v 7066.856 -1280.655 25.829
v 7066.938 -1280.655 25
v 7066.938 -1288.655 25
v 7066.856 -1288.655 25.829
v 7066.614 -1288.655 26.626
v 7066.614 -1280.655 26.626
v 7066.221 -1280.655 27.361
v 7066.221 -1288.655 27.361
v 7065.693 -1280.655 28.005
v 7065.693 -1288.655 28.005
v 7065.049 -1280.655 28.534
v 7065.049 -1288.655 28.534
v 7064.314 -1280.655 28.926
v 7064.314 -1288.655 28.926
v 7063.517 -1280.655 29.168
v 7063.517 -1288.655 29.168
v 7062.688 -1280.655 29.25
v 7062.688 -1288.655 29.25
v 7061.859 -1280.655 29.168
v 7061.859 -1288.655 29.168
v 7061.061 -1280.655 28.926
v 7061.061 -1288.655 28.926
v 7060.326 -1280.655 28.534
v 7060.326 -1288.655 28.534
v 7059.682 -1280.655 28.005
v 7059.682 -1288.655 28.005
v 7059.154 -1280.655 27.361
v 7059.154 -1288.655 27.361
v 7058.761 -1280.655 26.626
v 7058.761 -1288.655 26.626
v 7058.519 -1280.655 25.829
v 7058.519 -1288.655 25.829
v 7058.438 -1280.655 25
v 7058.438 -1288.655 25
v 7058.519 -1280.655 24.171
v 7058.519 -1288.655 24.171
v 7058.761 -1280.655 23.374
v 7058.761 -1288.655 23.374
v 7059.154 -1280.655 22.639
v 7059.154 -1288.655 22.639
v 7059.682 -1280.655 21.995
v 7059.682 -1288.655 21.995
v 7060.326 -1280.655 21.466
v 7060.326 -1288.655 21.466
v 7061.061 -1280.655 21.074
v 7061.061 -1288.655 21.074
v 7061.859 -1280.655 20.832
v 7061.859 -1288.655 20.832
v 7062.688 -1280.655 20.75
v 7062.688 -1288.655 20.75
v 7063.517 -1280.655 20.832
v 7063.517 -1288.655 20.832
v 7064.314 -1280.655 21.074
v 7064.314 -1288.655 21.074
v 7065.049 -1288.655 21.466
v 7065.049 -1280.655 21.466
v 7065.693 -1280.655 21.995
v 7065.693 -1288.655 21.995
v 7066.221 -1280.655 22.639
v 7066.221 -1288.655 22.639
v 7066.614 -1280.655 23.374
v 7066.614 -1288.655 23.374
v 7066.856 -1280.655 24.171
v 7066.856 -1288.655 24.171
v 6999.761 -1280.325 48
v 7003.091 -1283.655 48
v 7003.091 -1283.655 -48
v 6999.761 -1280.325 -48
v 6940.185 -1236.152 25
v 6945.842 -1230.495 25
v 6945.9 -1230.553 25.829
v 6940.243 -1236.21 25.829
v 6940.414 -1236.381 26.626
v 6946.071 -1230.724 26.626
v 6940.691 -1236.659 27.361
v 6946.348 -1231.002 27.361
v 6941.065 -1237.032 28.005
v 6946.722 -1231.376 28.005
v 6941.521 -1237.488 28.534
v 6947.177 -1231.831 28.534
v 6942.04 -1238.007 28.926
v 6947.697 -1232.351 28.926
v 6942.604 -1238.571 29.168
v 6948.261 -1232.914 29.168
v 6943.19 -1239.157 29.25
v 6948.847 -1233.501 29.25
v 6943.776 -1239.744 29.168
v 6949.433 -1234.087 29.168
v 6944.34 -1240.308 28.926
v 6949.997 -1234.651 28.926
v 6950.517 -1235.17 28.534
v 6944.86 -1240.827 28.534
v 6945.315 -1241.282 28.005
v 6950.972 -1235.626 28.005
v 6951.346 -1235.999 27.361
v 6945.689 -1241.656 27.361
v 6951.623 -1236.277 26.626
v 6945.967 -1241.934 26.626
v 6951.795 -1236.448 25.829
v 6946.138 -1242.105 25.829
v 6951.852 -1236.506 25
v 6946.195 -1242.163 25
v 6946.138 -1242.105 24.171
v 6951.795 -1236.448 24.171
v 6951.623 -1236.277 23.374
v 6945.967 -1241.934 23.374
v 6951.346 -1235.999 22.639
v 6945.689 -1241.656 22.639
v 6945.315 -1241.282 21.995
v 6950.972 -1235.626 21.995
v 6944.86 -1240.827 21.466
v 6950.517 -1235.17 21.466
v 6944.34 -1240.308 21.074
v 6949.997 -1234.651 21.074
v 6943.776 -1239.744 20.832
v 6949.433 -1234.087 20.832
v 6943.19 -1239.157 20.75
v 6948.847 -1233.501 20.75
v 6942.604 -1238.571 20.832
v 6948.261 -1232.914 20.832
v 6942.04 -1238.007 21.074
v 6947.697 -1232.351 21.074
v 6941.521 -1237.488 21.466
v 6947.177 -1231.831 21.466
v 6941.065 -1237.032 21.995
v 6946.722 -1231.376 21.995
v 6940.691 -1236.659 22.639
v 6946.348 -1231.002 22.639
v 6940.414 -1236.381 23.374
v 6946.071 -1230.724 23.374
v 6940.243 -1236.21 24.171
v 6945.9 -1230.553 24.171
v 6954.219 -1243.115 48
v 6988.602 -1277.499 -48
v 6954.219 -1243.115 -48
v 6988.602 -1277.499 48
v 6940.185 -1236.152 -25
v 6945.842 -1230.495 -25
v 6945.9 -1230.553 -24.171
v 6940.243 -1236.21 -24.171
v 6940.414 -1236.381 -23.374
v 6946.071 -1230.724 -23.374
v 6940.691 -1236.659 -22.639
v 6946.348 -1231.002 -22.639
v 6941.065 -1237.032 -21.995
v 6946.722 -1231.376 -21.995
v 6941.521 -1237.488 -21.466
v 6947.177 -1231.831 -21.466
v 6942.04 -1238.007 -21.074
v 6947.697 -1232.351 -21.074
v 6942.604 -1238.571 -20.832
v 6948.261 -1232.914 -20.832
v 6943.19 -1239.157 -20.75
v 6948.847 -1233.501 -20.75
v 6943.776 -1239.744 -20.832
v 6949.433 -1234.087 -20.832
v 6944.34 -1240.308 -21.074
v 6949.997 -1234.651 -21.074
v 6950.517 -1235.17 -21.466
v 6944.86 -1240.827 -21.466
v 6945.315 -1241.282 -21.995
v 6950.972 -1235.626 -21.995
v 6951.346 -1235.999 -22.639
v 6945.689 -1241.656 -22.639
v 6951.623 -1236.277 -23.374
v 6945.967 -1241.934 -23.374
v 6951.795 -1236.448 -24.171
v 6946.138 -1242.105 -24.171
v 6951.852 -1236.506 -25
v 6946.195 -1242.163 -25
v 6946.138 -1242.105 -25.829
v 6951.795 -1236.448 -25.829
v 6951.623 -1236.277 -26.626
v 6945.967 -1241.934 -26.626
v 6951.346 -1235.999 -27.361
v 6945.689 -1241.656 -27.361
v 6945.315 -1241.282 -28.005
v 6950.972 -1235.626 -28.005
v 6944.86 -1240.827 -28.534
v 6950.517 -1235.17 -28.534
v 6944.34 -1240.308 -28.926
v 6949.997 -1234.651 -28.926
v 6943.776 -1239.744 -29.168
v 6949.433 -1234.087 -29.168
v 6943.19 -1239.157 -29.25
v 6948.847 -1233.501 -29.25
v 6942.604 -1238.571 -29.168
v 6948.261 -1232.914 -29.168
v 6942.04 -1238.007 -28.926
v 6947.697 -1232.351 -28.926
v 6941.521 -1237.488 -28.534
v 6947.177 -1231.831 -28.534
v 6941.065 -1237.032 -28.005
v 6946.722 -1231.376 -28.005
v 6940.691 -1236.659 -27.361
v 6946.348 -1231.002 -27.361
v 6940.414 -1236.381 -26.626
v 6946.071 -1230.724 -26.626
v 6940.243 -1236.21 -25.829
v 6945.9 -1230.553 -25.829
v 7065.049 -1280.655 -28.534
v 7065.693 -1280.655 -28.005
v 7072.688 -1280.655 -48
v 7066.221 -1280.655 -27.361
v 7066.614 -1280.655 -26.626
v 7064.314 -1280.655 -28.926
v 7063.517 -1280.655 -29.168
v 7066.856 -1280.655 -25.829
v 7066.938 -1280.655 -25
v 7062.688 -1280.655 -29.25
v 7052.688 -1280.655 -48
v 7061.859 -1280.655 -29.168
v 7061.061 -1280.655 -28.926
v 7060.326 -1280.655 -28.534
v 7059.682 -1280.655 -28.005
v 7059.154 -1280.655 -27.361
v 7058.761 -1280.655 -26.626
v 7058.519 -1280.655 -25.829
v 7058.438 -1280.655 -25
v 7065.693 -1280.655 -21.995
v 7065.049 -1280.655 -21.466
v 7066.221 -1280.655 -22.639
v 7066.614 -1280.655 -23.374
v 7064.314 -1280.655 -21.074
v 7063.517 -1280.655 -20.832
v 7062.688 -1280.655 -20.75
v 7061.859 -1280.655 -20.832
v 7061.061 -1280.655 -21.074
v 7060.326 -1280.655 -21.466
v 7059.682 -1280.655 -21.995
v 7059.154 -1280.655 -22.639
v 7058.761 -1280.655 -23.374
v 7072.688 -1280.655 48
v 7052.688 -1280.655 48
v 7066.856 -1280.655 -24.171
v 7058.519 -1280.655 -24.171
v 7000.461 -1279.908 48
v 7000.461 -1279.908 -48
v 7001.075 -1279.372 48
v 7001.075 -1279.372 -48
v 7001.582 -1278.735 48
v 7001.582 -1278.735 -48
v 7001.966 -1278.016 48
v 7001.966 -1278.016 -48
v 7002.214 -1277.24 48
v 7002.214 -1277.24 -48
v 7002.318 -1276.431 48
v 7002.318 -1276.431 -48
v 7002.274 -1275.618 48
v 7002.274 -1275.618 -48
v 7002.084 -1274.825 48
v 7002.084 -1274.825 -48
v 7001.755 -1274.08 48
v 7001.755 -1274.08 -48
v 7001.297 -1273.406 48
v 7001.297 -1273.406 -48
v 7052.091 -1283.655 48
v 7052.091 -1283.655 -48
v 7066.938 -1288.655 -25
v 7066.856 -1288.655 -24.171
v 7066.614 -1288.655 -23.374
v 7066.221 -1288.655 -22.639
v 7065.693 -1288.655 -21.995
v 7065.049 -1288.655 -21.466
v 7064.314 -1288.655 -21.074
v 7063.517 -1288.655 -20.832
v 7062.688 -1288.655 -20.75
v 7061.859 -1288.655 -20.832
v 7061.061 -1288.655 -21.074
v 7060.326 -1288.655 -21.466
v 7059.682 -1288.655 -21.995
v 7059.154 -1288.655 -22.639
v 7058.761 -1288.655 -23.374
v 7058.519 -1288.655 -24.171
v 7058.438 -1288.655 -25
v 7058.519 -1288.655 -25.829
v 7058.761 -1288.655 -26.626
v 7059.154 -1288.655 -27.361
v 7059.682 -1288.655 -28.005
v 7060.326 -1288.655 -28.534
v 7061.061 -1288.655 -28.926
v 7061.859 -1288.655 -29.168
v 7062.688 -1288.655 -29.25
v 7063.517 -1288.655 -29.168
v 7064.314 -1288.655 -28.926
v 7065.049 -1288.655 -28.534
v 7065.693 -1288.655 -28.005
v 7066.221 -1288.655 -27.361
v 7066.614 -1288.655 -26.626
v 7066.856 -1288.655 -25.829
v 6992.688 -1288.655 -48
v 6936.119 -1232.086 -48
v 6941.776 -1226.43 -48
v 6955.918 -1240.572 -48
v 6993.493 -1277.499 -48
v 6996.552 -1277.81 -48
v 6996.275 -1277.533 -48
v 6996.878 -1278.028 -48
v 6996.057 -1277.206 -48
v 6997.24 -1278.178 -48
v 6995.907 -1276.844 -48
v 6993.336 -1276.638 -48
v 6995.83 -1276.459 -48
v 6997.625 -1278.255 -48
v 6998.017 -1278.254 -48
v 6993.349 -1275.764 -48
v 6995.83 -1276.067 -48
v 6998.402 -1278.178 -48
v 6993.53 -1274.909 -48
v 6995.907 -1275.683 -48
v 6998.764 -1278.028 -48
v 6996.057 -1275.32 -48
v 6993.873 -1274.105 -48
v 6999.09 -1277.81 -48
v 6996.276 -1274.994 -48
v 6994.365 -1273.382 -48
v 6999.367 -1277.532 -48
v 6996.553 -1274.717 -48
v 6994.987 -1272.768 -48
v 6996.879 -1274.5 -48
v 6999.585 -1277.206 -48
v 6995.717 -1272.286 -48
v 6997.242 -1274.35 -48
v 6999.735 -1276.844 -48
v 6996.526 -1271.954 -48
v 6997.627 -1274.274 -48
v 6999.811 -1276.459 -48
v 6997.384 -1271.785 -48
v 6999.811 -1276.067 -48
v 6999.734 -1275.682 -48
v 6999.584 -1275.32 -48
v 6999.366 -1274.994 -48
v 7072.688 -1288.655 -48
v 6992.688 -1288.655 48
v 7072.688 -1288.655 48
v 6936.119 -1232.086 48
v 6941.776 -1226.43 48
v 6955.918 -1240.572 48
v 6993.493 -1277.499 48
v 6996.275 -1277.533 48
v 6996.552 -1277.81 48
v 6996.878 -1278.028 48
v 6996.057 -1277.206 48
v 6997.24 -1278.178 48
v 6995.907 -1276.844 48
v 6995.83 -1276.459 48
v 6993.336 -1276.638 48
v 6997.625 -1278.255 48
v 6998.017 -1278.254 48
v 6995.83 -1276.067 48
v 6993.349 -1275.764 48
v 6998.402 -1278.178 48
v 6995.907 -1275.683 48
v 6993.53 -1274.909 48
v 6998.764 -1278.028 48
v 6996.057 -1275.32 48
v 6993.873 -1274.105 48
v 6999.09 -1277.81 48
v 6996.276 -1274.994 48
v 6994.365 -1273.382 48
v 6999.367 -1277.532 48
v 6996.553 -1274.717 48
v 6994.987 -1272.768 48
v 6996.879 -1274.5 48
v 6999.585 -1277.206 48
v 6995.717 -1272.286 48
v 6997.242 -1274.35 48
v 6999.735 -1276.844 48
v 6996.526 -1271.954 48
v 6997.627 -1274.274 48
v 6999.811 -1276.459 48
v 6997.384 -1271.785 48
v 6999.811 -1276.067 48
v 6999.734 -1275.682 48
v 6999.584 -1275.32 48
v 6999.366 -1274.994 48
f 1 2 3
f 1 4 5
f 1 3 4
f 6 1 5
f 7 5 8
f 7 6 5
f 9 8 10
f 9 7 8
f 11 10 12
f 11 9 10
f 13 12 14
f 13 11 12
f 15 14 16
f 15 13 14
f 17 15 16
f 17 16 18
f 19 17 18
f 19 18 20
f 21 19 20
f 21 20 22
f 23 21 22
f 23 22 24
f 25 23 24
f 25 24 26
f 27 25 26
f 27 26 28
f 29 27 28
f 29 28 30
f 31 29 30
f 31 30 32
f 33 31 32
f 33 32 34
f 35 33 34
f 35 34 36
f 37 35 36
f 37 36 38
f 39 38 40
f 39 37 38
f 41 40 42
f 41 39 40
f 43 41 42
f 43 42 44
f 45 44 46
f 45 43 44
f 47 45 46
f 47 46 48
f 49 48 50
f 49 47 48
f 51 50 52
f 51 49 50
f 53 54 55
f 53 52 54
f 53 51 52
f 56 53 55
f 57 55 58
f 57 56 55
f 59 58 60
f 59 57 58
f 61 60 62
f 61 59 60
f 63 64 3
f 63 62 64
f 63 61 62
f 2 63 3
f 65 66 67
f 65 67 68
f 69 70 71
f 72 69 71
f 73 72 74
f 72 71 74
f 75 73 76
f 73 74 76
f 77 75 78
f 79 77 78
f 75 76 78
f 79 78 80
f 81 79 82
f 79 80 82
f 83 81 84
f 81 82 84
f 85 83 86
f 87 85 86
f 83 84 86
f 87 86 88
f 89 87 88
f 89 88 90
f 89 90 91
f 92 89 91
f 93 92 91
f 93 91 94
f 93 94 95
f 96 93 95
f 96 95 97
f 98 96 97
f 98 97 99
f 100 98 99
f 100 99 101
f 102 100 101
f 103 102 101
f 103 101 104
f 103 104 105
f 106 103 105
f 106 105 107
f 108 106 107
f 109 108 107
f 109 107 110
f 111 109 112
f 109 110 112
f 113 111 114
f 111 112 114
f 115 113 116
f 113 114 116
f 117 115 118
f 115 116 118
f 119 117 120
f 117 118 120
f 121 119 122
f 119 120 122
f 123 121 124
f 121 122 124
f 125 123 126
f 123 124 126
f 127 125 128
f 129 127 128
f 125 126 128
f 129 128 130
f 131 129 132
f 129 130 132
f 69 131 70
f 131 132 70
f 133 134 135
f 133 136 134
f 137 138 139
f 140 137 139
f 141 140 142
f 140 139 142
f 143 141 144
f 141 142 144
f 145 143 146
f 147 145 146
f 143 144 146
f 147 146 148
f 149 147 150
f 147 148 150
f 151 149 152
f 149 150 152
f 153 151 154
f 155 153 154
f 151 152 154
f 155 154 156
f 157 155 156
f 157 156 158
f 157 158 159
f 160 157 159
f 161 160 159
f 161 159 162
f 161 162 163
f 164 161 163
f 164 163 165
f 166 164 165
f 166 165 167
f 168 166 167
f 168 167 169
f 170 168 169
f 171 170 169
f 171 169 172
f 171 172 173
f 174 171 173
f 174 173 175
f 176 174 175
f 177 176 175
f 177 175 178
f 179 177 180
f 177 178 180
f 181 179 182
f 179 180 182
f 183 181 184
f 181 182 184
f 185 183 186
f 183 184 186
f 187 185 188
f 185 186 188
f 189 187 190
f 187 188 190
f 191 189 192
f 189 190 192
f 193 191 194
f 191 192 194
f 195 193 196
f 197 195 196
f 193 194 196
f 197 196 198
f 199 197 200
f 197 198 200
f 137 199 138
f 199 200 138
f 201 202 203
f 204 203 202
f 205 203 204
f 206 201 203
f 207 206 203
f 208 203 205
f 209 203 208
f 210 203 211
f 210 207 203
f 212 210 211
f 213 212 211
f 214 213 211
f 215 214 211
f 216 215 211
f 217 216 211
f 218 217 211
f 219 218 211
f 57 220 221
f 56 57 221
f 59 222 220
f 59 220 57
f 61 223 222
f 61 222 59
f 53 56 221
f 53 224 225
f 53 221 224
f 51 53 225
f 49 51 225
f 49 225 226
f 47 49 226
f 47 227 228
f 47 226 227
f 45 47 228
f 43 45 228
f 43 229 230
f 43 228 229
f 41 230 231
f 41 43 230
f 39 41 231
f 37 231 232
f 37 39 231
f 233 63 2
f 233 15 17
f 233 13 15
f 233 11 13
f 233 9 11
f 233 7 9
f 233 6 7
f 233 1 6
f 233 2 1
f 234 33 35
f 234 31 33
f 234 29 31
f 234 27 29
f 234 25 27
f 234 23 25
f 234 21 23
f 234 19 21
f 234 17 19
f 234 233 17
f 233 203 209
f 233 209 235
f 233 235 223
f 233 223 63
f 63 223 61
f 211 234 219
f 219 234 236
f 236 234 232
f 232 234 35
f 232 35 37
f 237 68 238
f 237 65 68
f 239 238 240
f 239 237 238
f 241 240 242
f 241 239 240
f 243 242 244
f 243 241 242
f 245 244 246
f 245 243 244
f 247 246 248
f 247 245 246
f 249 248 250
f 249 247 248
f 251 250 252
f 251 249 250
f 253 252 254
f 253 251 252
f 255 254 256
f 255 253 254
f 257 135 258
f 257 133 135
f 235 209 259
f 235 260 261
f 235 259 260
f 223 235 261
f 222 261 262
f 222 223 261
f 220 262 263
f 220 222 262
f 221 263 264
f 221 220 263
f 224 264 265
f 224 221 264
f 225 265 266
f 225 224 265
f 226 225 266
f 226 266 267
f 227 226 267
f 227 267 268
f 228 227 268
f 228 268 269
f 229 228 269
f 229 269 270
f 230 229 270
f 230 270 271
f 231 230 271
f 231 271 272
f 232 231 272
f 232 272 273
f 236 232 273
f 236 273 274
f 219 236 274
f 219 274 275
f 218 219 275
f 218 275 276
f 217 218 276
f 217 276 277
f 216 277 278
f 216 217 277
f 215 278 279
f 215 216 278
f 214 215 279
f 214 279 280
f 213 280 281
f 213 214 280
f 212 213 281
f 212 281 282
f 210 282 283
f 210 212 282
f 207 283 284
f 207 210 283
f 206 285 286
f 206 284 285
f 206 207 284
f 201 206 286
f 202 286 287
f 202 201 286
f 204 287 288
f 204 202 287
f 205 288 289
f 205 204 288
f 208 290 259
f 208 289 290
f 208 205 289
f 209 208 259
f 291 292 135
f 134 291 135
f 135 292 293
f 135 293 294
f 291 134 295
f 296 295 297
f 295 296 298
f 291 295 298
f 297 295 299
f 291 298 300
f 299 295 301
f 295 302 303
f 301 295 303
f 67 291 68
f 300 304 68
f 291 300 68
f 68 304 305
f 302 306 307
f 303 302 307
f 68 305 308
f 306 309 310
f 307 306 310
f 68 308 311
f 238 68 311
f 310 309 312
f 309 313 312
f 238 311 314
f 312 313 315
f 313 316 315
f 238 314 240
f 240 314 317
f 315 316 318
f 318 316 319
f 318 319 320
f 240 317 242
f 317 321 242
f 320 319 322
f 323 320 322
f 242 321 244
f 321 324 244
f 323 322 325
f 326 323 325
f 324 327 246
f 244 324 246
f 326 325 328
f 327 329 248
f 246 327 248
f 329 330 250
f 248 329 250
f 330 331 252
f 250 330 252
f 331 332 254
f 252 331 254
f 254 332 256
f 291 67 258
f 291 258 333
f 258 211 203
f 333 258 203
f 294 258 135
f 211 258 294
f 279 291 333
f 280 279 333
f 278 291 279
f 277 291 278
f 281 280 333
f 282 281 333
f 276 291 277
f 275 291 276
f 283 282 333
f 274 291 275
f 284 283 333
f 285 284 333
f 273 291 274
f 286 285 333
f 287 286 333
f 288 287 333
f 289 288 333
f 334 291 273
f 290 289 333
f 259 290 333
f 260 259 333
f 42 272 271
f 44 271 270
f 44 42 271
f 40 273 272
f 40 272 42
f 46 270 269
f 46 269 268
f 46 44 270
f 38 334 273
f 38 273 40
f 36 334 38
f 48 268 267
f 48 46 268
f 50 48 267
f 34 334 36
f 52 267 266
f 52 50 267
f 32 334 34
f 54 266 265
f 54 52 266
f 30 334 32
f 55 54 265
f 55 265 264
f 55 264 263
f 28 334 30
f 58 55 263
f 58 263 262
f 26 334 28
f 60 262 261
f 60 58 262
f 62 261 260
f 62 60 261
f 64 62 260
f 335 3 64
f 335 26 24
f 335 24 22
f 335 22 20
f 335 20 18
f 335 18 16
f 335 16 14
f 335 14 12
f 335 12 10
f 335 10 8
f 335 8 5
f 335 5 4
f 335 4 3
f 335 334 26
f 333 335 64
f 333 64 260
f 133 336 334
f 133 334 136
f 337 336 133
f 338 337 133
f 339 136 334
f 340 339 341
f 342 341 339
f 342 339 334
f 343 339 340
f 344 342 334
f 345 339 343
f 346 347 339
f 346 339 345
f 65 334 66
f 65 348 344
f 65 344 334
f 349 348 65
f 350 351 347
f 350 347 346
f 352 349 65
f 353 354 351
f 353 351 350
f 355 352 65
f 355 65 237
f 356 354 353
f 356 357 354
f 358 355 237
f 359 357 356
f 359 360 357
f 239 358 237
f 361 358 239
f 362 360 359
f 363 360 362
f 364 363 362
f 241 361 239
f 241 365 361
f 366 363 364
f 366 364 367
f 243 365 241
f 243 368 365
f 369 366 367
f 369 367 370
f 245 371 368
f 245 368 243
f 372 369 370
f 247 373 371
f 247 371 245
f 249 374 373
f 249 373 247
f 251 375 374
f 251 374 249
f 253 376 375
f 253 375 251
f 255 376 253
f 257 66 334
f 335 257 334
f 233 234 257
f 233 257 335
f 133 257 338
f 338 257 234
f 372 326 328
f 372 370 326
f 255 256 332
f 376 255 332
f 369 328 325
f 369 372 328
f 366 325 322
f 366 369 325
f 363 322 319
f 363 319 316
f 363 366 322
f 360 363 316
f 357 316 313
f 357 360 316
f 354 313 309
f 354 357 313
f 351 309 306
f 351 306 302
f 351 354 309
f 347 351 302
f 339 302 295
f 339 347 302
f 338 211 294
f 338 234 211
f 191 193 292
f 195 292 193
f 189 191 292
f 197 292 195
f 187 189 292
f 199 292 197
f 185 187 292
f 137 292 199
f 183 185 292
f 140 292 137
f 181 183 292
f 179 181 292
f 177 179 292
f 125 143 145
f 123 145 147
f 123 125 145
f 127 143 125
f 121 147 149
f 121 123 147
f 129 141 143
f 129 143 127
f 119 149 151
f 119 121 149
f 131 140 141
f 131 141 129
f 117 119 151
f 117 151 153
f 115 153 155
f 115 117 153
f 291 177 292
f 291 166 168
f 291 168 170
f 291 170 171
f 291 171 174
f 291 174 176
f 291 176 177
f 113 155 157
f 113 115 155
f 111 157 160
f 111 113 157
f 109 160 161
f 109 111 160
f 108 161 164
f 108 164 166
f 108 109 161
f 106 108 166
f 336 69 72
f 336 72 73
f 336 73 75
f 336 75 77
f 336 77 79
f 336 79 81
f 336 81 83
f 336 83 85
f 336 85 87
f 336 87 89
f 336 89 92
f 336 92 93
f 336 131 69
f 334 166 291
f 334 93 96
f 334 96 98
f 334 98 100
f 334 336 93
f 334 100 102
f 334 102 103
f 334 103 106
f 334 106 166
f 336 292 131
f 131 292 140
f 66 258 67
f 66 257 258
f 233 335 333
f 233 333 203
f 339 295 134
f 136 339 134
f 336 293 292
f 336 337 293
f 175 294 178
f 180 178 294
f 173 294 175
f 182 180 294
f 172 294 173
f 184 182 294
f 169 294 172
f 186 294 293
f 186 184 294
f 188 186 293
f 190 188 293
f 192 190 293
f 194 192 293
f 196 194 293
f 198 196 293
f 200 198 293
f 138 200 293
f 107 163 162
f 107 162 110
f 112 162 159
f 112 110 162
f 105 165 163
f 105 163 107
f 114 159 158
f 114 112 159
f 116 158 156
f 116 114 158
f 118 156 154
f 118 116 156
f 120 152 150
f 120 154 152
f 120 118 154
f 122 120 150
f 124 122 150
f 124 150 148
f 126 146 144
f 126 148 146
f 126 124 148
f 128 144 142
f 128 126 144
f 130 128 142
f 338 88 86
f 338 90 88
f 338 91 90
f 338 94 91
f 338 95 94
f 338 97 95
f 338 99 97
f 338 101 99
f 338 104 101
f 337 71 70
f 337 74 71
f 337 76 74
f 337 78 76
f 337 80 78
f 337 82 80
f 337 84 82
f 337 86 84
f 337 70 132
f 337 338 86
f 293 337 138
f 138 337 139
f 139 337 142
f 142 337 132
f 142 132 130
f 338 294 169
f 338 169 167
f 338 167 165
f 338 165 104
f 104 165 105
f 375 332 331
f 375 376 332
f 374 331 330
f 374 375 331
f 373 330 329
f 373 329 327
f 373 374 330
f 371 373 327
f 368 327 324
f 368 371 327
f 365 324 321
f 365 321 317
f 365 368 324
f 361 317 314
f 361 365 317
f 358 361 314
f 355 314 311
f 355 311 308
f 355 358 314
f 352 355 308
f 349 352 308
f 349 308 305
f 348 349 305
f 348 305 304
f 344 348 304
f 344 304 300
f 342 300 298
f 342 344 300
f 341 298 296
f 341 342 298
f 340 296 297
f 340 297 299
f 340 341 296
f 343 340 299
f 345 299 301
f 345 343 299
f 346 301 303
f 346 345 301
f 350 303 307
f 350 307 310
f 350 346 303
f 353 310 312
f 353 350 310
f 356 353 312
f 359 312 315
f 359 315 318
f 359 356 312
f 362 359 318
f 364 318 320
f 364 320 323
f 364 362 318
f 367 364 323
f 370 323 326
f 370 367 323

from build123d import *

# Parameters (mm, degrees)
EXTRUDE_1_DEPTH         = 48
HOLE_WIZARD_8_5_8_5_1_D = 8.5


with BuildPart() as part:
    # 草图1 → 凸台-拉伸1 (new, symmetric)
    with BuildSketch(Plane.XY):
        Polygon((6936.119122288, -1232.086390659), (6992.687664783, -1288.654933154), (7072.687664783, -1288.654933154), (7072.687664783, -1280.654933154), (7052.687664783, -1280.654933154), (6955.918112162, -1240.571672033), (6941.775976538, -1226.429536409), align=None)
        with BuildLine():
            Line((7009.090927681, -1283.654933154), (7003.090927681, -1283.654933154))
            Line((7003.090927681, -1283.654933154), (6999.760549745, -1280.324555218))
            ThreePointArc((6999.760549745, -1280.324555218), (7002.213755914, -1277.239517812), (7001.296666197, -1273.406161221))
            Line((7001.296666197, -1273.406161221), (6999.365595427, -1274.993916141))
            ThreePointArc((6999.365595427, -1274.993916141), (6997.055371947, -1278.111879141), (6997.626530039, -1274.273571671))
            Line((6997.626530039, -1274.273571671), (6997.383769074, -1271.785386165))
            ThreePointArc((6997.383769074, -1271.785386165), (6994.101203016, -1273.731324494), (6993.49338103, -1277.49861375))
            Line((6993.49338103, -1277.49861375), (6988.602413191, -1277.49861375))
            Line((6988.602413191, -1277.49861375), (6954.21874867, -1243.114949228))
            Line((6954.21874867, -1243.114949228), (7052.090927681, -1283.654933154))
            Line((7052.090927681, -1283.654933154), (7029.403393536, -1283.654933154))
            Line((7029.403393536, -1283.654933154), (7009.090927681, -1283.654933154))
        make_face(mode=Mode.SUBTRACT)
    extrude(amount=EXTRUDE_1_DEPTH, both=True)

    # Ø8.5 (8.5) 直径孔1 (through all)
    with Locations(Plane(origin=(2852.016365815, 2852.016365815, 0), x_dir=(0.7071067811865628, -0.7071067811865324, 0), z_dir=(-0.7071067811865324, -0.7071067811865628, 0))):
        with Locations((5785.79350833, -25), (5785.79350833, 25)):
            hole_wizard_8_5_8_5_1 = Hole(HOLE_WIZARD_8_5_8_5_1_D / 2)

    # 镜向1: Ø8.5 (8.5) 直径孔1 across plane
    add(hole_wizard_8_5_8_5_1.mirror(Plane(origin=(6424.240586557, -2661.0075789, 0), x_dir=(0, 0, 1), z_dir=(-0.9238795325112645, 0.3826834323651437, 0))), mode=Mode.SUBTRACT)


solid = part.part
